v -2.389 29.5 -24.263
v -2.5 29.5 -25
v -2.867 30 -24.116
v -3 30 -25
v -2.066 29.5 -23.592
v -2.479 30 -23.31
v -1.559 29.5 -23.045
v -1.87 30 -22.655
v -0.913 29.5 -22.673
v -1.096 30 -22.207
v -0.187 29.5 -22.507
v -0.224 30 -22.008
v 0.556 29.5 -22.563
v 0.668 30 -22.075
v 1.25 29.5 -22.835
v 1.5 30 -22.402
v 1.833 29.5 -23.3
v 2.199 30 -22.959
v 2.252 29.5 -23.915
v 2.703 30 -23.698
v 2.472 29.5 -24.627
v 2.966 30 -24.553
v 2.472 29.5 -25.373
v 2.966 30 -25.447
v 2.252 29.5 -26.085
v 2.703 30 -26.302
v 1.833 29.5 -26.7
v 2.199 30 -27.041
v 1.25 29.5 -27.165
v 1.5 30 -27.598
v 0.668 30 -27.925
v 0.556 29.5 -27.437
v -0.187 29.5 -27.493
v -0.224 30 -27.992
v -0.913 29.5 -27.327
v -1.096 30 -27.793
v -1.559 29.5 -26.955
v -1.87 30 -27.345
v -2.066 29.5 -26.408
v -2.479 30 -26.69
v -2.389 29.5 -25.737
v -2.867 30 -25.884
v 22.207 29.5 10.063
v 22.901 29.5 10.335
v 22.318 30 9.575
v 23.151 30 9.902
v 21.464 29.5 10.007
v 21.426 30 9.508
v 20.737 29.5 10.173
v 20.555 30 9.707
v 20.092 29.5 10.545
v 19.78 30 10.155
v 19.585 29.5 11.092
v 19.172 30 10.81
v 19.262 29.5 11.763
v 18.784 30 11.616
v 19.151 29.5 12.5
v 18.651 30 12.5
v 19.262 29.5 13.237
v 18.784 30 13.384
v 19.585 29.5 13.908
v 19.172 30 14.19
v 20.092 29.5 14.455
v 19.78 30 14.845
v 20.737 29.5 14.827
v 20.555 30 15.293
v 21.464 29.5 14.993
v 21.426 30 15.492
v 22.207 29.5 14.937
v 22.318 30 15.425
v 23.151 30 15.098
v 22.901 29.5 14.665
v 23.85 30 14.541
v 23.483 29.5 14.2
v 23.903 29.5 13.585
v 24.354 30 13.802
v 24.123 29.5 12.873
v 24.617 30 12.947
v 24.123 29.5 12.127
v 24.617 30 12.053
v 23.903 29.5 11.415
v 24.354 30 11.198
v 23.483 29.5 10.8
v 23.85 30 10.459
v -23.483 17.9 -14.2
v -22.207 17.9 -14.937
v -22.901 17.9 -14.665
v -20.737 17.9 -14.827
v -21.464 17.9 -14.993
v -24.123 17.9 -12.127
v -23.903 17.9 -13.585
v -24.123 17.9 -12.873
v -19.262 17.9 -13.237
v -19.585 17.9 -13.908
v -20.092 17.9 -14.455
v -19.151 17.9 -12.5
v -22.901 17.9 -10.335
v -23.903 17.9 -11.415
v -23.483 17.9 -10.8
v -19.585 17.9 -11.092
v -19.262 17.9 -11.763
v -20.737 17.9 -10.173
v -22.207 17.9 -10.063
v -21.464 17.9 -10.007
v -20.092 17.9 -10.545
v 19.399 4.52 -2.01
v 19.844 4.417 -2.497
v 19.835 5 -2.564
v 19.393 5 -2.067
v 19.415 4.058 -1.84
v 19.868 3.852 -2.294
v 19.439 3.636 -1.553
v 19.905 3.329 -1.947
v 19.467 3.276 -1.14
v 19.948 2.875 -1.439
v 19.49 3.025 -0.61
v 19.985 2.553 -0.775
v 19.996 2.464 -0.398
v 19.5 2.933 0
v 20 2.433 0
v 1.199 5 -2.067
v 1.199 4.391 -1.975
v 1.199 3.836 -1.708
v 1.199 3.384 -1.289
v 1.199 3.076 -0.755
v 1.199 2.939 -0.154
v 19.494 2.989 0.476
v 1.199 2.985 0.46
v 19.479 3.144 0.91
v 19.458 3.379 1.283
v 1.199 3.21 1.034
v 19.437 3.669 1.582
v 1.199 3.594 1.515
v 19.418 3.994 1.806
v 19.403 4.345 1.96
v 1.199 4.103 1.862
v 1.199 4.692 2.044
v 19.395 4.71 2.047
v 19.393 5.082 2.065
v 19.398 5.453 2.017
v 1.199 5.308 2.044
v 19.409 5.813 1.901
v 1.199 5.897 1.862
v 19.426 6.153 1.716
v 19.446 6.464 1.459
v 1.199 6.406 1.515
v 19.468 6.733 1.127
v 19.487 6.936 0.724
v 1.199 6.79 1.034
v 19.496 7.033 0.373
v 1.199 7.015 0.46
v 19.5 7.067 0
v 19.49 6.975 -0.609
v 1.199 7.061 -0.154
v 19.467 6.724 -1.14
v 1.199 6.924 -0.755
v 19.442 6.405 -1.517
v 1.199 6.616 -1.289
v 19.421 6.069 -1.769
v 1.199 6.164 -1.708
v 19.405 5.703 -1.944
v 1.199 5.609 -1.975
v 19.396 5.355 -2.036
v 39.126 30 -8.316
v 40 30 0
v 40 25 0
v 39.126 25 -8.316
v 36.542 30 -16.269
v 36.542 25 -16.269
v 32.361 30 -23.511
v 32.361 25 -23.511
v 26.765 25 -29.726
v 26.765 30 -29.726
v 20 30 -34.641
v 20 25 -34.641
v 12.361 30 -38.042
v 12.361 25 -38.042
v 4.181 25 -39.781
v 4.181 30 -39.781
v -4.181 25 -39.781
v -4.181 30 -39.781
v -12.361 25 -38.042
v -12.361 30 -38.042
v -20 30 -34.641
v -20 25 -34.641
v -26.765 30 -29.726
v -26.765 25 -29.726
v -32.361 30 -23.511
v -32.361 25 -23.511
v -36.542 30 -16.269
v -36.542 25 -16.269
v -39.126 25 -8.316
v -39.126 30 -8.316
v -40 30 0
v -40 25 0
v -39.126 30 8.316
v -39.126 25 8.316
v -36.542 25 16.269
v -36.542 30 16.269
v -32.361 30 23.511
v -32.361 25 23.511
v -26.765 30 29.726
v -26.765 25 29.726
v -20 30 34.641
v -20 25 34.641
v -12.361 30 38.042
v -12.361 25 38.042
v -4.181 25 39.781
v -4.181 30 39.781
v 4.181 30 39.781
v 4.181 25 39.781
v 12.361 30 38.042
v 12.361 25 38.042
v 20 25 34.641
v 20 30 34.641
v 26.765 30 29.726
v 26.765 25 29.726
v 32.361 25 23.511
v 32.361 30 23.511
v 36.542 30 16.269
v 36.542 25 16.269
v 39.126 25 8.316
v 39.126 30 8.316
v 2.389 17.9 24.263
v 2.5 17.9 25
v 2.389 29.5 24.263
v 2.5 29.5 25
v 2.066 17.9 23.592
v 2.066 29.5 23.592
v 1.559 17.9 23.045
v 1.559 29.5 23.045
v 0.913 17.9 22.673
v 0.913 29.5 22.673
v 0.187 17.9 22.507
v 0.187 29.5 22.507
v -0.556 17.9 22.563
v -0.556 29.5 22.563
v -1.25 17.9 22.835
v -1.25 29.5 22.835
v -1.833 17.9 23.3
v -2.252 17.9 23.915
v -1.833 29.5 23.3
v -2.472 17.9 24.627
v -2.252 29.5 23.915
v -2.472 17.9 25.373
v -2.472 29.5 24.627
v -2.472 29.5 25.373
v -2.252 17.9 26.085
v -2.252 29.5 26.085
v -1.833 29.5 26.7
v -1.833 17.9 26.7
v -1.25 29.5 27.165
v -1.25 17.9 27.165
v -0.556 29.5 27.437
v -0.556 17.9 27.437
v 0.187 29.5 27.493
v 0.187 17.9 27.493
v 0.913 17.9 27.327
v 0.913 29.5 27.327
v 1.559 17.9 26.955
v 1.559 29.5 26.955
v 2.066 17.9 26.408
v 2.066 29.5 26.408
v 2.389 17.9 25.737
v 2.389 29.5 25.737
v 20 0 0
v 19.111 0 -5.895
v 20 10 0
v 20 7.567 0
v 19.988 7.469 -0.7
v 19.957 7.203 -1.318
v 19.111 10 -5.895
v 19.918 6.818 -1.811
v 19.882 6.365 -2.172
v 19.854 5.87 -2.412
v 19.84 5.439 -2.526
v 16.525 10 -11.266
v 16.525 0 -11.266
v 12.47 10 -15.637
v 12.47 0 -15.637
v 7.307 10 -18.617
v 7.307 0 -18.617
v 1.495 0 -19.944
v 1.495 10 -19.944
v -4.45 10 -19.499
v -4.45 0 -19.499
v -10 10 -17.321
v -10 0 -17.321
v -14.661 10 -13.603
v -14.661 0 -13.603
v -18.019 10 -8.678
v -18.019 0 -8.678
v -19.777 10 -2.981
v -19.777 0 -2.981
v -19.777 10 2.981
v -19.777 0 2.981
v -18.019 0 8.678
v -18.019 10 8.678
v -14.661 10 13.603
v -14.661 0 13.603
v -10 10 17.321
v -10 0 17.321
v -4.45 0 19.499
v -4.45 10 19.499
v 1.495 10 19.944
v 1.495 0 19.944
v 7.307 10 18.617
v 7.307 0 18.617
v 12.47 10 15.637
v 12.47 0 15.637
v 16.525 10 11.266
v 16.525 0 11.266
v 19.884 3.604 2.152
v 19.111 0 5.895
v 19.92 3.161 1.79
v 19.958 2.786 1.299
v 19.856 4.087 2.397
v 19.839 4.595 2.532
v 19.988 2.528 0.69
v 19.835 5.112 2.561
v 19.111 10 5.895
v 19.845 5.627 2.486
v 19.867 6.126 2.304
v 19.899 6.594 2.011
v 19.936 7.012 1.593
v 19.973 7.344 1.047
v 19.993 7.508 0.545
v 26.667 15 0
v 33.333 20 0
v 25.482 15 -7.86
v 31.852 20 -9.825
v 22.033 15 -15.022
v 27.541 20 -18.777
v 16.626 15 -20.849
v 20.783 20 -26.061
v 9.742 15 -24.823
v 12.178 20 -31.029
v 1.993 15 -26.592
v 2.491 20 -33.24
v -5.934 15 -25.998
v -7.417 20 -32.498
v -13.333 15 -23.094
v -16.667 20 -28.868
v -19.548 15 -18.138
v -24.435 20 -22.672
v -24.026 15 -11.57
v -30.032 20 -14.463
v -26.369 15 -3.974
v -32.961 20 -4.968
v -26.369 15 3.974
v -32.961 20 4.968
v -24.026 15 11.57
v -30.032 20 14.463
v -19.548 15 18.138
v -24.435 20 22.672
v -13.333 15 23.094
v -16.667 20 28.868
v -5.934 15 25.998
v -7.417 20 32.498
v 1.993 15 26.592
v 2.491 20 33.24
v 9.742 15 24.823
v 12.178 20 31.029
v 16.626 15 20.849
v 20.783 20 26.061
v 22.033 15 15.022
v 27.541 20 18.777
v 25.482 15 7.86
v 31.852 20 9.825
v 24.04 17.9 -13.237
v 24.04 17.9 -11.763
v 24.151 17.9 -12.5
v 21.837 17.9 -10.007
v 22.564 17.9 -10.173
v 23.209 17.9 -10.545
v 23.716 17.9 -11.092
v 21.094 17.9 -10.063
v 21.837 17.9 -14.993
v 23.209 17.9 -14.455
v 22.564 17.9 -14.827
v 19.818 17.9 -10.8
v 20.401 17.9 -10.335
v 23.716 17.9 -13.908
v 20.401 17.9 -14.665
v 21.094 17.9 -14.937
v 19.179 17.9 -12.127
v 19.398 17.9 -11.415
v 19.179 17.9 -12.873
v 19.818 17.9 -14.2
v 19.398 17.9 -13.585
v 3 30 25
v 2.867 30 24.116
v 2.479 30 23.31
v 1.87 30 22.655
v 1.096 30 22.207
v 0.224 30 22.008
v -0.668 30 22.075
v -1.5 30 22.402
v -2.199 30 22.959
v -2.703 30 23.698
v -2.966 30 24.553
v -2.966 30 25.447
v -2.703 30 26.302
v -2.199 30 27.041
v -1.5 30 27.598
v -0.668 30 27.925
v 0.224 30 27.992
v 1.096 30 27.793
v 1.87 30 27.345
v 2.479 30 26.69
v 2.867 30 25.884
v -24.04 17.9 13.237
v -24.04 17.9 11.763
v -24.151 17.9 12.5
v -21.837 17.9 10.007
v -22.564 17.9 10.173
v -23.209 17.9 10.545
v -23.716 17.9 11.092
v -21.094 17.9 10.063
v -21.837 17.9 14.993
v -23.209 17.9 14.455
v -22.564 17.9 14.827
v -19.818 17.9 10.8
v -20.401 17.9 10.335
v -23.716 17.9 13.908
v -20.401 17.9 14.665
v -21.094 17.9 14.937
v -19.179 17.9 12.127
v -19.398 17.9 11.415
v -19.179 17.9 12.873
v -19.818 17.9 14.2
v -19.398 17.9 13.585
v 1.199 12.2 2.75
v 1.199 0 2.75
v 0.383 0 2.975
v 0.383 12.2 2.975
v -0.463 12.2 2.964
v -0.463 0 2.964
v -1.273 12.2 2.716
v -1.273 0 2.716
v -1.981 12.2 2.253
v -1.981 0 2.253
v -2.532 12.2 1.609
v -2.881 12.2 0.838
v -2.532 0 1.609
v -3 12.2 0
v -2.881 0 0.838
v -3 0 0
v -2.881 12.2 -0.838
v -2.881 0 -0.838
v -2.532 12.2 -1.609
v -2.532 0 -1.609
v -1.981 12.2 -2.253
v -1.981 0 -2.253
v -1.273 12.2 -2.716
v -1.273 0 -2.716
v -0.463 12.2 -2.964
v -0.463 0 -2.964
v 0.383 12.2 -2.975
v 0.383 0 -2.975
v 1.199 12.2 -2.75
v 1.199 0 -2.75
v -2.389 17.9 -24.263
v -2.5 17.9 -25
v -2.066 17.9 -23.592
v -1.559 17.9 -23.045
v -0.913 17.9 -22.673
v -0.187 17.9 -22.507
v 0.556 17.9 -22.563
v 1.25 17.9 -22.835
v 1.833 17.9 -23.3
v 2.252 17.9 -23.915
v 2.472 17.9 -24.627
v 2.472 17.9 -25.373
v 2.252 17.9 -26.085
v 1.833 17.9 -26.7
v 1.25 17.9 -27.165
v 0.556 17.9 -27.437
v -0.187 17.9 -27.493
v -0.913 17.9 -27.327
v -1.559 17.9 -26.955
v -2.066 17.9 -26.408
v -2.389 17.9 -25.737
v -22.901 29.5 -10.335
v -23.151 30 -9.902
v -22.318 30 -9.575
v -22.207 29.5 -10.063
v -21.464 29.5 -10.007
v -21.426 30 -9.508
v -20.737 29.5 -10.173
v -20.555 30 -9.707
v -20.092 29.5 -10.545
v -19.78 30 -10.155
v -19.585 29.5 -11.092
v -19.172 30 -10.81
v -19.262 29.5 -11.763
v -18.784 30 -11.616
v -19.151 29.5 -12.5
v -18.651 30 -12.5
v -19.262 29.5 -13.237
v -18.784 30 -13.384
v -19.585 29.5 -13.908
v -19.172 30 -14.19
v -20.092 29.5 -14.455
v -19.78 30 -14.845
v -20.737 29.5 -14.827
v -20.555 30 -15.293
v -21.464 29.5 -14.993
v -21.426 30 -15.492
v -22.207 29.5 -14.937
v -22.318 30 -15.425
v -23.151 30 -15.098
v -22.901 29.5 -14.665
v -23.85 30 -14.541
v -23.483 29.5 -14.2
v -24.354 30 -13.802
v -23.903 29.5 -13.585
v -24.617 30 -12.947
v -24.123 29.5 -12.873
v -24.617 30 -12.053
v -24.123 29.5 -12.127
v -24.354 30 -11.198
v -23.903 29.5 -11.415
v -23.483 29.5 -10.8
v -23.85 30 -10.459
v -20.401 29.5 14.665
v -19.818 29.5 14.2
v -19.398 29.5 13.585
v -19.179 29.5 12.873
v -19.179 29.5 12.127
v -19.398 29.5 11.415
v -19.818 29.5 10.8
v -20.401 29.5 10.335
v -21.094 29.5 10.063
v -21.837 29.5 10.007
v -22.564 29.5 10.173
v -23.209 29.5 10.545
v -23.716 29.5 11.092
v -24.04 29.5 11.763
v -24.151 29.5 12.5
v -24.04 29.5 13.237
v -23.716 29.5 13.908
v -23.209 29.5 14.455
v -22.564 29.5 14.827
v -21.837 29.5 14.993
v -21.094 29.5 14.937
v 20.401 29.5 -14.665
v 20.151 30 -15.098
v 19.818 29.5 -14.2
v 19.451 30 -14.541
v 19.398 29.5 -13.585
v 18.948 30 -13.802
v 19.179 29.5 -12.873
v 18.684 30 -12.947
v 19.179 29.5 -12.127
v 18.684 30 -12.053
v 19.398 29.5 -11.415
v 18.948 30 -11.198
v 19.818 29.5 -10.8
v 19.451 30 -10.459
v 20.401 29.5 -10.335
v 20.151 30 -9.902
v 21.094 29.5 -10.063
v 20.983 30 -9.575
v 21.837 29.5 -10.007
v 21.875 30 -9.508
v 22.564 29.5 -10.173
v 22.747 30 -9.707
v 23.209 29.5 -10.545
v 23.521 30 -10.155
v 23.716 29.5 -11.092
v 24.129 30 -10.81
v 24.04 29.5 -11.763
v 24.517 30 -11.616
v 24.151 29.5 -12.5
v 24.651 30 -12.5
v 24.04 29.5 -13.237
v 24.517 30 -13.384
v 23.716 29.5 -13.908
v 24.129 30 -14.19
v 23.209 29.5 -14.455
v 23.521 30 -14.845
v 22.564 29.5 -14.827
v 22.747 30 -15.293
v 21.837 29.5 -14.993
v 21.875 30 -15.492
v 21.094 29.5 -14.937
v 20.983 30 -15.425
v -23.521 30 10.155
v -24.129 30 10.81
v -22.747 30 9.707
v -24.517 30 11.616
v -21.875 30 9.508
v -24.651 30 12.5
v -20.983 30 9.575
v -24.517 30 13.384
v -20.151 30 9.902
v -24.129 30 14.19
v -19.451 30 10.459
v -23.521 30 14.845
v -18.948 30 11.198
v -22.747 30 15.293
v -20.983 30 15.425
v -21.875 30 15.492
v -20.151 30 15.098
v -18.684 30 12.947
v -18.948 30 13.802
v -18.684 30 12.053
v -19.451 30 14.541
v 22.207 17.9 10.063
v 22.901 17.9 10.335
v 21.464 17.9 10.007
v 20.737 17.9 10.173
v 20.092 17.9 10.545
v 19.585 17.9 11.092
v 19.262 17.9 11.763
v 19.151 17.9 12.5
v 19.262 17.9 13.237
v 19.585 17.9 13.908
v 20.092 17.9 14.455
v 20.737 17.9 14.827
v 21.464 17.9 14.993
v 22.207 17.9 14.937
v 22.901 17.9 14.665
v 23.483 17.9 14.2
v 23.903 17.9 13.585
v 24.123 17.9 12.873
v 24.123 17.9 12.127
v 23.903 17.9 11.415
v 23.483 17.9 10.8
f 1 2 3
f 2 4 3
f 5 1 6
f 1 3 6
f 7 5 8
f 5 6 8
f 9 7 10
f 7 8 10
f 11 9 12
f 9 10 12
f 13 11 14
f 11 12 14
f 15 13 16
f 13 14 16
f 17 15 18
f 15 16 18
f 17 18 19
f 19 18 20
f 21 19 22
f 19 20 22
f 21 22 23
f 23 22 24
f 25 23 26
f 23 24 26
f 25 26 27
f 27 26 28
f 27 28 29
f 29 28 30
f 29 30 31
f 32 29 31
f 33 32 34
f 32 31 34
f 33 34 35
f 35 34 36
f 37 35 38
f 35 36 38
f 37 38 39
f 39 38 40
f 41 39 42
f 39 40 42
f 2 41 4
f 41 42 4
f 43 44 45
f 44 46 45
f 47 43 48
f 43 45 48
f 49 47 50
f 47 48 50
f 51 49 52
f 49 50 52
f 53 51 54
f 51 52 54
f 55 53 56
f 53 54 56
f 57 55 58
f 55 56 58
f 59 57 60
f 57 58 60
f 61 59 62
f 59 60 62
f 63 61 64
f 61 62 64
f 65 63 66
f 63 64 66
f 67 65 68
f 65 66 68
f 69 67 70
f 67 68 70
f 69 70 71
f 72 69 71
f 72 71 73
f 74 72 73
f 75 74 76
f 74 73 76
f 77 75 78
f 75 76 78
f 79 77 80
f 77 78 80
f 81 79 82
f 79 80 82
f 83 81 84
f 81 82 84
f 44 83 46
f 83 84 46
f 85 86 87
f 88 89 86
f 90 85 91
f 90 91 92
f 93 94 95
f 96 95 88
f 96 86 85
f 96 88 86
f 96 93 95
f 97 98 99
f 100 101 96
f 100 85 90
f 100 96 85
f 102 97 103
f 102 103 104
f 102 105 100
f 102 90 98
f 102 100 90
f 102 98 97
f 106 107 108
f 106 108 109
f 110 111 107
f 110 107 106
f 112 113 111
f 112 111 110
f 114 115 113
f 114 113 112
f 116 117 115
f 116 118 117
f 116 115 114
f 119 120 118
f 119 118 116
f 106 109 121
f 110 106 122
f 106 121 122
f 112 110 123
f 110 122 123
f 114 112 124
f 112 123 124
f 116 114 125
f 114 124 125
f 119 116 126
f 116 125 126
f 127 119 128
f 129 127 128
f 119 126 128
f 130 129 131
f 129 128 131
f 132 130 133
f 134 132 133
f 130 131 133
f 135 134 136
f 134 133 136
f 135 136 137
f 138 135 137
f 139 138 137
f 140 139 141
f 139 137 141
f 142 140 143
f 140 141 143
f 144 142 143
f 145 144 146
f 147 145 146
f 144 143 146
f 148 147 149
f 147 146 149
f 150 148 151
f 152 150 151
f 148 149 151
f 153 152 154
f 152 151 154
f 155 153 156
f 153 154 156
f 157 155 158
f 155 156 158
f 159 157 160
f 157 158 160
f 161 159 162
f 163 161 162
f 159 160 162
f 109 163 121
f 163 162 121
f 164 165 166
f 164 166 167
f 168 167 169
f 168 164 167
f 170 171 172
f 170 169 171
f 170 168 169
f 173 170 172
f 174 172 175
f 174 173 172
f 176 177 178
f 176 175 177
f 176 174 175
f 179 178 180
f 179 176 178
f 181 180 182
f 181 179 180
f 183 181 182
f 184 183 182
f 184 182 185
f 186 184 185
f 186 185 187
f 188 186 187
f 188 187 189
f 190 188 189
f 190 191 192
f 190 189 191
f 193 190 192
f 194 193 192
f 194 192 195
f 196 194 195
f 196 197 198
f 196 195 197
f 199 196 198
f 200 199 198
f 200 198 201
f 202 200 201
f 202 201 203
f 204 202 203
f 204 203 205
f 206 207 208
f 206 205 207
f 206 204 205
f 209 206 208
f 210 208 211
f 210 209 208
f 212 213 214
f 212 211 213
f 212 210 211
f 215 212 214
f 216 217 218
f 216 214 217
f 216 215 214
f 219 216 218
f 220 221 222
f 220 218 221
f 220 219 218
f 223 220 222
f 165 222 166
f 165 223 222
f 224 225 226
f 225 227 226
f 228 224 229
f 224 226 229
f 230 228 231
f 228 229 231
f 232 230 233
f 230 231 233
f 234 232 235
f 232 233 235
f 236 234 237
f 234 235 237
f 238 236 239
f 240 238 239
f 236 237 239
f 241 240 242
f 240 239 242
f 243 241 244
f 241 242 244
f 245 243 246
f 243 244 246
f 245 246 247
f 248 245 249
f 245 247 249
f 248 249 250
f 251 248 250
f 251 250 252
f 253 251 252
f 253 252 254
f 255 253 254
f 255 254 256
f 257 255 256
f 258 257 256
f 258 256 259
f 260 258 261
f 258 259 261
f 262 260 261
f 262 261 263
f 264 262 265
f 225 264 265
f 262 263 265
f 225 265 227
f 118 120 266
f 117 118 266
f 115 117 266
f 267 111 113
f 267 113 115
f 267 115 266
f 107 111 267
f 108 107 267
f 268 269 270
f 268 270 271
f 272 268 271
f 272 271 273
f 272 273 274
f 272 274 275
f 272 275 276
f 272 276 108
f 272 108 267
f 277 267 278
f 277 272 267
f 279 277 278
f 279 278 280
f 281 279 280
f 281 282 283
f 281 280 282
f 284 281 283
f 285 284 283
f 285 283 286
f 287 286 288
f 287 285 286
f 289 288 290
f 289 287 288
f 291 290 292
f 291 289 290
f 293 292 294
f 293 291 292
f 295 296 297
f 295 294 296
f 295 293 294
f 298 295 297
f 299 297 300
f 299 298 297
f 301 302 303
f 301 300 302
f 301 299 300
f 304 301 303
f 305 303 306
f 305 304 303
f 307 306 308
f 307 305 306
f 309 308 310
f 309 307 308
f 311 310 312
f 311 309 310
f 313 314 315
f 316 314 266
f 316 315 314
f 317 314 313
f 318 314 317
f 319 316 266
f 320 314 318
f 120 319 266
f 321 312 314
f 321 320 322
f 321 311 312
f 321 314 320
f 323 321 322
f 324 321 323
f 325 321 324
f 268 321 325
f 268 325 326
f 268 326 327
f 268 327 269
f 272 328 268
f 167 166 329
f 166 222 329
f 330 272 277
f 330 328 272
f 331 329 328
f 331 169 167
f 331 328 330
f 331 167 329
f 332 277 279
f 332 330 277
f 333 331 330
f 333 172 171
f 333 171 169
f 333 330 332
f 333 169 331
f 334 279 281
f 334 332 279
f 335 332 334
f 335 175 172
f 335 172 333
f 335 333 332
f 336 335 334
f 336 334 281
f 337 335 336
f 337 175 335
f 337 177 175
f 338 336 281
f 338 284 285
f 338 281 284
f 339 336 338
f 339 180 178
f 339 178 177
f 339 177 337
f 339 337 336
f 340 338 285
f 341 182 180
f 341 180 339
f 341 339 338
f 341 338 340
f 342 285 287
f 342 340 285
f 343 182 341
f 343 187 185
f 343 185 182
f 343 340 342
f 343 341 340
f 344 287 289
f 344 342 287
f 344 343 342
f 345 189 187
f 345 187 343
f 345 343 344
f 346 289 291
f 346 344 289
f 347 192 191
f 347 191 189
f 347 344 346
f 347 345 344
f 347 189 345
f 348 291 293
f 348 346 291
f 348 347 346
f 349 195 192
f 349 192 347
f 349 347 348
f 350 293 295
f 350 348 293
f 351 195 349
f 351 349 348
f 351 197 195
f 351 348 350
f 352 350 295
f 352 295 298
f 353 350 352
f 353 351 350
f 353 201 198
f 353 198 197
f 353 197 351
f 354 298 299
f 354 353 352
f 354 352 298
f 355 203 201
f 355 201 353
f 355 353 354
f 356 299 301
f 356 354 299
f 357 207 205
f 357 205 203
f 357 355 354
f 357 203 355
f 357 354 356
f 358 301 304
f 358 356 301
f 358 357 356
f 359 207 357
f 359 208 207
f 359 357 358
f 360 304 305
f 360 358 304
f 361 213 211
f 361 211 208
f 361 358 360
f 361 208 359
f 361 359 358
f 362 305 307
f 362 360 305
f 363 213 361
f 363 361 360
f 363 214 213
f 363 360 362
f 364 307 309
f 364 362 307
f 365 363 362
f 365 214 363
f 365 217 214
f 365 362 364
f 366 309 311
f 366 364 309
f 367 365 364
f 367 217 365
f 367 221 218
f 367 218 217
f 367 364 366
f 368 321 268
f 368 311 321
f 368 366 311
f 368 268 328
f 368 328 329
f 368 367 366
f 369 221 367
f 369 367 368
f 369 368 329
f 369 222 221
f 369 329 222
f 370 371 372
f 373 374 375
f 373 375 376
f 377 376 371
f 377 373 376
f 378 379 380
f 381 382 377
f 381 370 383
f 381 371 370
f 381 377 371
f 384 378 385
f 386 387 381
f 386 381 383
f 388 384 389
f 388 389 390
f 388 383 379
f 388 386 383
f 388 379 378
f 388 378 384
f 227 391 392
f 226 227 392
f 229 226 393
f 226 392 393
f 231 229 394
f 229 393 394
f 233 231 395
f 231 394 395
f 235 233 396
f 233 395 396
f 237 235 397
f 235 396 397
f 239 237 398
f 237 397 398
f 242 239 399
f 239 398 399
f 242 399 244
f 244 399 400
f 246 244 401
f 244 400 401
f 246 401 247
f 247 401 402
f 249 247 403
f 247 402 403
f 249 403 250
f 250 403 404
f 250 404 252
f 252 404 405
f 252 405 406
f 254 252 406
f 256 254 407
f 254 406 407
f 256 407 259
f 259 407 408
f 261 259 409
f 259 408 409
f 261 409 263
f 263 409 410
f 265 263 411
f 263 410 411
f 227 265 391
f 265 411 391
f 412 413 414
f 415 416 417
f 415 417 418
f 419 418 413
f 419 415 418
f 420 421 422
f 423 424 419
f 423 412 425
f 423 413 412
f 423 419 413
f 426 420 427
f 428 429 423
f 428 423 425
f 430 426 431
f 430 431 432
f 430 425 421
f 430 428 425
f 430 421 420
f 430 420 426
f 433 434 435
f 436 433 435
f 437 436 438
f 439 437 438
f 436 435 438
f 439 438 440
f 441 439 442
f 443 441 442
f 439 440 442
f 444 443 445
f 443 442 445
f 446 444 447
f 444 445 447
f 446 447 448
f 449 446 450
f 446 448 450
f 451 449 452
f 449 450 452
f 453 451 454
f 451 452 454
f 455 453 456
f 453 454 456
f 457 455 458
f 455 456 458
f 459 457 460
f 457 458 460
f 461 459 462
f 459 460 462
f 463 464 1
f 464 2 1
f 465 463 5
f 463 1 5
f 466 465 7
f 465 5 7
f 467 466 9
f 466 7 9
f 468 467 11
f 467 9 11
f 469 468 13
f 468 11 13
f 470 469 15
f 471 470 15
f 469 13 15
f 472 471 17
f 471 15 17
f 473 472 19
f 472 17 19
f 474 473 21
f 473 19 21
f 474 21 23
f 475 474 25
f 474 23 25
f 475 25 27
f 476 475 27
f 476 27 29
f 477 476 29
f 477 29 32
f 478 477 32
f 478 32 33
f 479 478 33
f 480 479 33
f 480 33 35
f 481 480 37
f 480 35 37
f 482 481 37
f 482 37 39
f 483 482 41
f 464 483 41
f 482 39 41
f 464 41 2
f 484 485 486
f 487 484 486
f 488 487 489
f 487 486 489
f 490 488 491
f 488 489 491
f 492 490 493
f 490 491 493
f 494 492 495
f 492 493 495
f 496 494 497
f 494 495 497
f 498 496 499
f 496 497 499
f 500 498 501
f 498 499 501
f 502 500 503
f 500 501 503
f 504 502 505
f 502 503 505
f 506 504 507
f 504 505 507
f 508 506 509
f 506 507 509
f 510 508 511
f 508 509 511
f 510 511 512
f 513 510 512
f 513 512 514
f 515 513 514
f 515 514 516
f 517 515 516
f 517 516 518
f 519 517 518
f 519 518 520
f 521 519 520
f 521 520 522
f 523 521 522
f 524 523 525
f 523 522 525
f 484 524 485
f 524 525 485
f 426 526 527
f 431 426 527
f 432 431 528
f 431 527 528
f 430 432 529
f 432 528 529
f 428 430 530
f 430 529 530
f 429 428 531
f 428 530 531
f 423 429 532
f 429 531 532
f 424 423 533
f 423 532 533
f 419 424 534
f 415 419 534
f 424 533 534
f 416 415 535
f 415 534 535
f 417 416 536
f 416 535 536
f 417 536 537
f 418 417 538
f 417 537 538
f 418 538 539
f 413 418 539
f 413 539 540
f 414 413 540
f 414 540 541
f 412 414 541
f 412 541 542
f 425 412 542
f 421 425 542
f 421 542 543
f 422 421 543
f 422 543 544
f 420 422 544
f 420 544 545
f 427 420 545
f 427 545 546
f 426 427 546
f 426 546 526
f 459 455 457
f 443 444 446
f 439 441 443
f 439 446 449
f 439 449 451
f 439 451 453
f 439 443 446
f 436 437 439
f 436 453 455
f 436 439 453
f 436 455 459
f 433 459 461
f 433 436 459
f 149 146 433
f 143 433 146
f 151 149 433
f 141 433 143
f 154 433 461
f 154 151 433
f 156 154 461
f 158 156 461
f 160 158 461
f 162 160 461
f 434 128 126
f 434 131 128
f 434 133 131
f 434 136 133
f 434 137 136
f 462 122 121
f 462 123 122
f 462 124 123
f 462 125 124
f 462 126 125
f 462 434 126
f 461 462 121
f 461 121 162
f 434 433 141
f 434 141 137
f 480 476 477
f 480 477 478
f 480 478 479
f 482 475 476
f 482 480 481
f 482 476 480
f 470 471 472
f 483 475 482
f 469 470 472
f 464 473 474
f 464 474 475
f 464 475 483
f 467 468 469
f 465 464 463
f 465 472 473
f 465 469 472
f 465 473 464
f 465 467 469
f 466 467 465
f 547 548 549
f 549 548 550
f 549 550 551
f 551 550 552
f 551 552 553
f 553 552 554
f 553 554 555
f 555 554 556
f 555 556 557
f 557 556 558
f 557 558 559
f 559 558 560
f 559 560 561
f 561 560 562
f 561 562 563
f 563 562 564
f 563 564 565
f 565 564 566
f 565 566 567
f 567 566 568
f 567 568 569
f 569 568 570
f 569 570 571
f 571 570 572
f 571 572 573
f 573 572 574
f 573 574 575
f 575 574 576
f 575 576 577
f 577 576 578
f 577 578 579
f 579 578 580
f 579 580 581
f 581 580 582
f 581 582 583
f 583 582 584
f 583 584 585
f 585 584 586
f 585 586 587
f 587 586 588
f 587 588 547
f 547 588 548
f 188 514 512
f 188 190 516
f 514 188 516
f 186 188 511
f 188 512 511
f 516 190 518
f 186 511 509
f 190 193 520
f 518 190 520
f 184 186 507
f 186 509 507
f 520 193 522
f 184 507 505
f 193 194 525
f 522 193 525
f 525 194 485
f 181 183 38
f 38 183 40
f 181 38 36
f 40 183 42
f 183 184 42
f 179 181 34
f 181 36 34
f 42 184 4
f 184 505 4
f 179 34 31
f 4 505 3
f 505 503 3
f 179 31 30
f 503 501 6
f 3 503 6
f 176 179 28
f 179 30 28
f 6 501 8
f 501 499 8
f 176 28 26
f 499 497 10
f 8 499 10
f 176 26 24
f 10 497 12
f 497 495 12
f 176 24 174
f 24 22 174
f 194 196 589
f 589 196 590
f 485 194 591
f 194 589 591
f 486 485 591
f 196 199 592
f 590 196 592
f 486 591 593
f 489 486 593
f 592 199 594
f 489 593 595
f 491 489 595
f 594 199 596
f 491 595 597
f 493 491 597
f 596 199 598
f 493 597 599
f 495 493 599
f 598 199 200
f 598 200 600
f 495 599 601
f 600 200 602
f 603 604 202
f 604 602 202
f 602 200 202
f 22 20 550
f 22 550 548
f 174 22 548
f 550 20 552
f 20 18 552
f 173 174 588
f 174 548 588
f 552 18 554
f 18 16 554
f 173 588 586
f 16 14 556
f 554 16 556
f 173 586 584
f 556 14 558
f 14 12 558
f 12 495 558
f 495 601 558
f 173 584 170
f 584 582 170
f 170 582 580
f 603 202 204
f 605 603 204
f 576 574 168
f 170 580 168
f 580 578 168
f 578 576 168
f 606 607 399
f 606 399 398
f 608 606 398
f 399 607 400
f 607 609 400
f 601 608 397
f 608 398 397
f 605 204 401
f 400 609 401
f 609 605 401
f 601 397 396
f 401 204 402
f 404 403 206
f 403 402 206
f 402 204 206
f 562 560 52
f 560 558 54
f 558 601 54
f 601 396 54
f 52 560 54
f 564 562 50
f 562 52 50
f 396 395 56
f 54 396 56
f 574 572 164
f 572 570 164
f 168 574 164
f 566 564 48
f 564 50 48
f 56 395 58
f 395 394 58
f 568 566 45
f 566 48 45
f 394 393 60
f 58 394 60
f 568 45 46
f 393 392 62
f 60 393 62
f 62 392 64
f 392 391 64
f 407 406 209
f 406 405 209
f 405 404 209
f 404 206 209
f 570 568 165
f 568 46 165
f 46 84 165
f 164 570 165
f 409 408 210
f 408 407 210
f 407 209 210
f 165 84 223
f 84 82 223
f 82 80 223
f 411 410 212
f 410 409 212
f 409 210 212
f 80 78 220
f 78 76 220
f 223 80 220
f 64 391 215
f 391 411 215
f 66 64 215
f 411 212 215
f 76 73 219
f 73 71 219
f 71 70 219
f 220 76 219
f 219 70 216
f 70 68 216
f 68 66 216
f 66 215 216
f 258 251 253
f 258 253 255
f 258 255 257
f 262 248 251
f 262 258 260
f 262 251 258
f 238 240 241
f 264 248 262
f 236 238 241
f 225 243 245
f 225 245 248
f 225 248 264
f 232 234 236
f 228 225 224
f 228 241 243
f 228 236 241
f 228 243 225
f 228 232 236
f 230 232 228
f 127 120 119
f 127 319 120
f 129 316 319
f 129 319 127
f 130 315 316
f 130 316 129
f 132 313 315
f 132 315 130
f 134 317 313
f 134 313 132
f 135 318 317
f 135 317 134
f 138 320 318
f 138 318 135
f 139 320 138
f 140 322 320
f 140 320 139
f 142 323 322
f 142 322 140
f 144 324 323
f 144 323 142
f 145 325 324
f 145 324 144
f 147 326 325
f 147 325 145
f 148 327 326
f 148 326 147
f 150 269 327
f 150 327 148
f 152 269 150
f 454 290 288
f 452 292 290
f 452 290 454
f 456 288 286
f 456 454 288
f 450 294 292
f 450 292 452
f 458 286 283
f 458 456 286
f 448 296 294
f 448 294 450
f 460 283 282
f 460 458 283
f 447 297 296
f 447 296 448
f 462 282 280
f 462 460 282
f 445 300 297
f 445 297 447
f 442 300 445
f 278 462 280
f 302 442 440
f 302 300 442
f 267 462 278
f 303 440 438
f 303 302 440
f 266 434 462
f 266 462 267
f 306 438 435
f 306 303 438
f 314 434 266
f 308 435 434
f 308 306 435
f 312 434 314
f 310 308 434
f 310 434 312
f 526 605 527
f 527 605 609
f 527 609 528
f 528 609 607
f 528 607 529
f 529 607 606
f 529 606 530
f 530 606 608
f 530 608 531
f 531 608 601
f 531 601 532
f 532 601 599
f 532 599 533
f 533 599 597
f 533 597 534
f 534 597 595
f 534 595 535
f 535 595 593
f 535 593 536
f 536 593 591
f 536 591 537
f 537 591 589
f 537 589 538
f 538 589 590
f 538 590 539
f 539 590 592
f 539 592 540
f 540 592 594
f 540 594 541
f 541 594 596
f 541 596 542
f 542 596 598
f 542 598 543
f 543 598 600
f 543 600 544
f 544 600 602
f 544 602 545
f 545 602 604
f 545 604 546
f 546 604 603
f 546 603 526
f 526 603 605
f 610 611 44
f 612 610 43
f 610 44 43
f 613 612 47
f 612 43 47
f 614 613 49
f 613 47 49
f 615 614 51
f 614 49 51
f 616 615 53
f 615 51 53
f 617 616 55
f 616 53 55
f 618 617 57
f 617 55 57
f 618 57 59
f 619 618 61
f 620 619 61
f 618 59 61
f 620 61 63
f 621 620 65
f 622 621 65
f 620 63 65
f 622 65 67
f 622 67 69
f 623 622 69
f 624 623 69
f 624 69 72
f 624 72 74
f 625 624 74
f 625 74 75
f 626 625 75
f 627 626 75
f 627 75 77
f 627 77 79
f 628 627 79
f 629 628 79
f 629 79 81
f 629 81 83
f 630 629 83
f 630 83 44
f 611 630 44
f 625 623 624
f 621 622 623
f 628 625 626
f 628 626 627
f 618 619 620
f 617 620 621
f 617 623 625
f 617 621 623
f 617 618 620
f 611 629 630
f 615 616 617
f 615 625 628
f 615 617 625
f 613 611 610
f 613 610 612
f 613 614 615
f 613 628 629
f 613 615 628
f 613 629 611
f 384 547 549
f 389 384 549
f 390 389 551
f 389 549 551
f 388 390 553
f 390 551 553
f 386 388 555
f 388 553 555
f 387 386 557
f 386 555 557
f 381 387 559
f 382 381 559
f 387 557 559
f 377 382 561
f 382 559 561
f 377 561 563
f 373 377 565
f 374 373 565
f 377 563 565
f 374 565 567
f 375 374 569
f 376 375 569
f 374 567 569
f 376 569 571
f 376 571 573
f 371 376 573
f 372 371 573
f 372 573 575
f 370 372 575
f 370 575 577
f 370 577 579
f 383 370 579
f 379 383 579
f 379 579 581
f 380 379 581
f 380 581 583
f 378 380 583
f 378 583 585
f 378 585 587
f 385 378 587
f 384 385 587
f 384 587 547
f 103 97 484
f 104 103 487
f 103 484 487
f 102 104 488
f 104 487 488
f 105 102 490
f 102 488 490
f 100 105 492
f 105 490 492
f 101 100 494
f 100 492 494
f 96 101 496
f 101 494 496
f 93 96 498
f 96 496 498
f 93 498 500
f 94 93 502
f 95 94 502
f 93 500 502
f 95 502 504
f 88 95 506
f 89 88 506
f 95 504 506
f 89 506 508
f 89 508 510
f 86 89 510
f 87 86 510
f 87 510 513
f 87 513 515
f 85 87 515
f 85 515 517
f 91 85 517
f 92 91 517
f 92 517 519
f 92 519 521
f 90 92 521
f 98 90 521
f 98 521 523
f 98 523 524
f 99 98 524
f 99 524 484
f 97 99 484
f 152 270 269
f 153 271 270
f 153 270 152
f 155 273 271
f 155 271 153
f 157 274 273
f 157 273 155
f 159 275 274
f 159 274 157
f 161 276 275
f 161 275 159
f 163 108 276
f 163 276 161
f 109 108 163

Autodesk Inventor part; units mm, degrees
ref_plane "XZ Plane" through (0, 0, 0) normal (0, 1, 0) x (-1, 0, 0)
ref_plane "XY Plane" through (0, 0, 0) normal (0, 0, 1) x (1, 0, 0)
sketch "Skizze3" plane through (0, 0, 0) normal (0, 1, 0) x (-1, 0, 0)
  point P0 (0, 0)
sketch "Skizze4" plane through (0, 0, 0) normal (0, 0, 1) x (1, 0, 0)
  line L0 (0, 0) -> (20, 0)
  line L1 (20, 0) -> (20, 10)
  line L2 (20, 10) -> (40, 25)
  line L3 (40, 25) -> (40, 30)
  line L4 (40, 30) -> (0, 30)
  line L5 (0, 30) -> (0, 0)
  dimension "d5" = 40
  dimension "d6" = 80
  dimension "d7" = 10
  dimension "d8" = 15
  dimension "d9" = 5
revolve "Umdrehung1" add sketch "Skizze4" angle 360 about axis through (0, 30, 0) along (0, -1, 0)
sketch "Skizze5" plane through (0, 30, 0) normal (0, 1, 0) x (1, 0, 0)
  circle A0 centre (0, -25) radius 2.5
  line L0 (0, 56) -> (0, -56) projected
  point P0 (0, 0)
  dimension "d11" = 25
  dimension "d12" = 5
extrude "Extrusion3" cut sketch "Skizze5" against normal blind 12.1
chamfer "Fase1" distance 0.5 angle 45 1 edges at (-2.5, 30, 25)
pattern_circular "Runde Anordnung1" count 6 over 360 about axis through (0, 5, 0) along (0, -1, 0) of "Extrusion3", "Fase1"
ref_plane "Arbeitsebene1" through (20, 0, 0) normal (1, 0, 0) x (0, 1, 0)
sketch "Skizze6" plane through (20, 0, 0) normal (1, 0, 0) x (0, 1, 0)
  line L0 (10, 20) -> (10, -20) projected
  line L1 (0, 20) -> (0, -20) projected
  line L2 (-2.9204, 0) -> (2.9204, 0)
  point P0 (0, 0)
  point P1 (5, 0)
  point P2 (0, 0)
  dimension "d22" = 5
sketch "Skizze7" plane through (0, 0, 0) normal (0, -1, 0) x (1, 0, 0)
  circle A0 centre (0, 0) radius 3
  line L0 (1.199, 2.75) -> (1.199, -2.75)
  point P0 (0, 0)
  dimension "d23" = 6
  dimension "d24" = 5.5
extrude "Extrusion4" cut sketch "Skizze7" against normal blind 12.2 contours L0 A0 picked at (-0.2225, -0.8366)
hole "Bohrung1" at (20, 5, 0) direction (-1, 0, 0) diameter 4.134 depth 18.801 thread size "M5x0.8" class "6H" standard "ISO Metric profile"
chamfer "Fase2" distance 0.5 angle 45 3 edges at (19.8929, 4.9998, 2.067) (19.9385, 6.3471, -1.5678) (19.9383, 3.6548, -1.5694)
properties part number "BT405_trajan20_21" material "Kunststoff, undurchsichtig Schwarz"
